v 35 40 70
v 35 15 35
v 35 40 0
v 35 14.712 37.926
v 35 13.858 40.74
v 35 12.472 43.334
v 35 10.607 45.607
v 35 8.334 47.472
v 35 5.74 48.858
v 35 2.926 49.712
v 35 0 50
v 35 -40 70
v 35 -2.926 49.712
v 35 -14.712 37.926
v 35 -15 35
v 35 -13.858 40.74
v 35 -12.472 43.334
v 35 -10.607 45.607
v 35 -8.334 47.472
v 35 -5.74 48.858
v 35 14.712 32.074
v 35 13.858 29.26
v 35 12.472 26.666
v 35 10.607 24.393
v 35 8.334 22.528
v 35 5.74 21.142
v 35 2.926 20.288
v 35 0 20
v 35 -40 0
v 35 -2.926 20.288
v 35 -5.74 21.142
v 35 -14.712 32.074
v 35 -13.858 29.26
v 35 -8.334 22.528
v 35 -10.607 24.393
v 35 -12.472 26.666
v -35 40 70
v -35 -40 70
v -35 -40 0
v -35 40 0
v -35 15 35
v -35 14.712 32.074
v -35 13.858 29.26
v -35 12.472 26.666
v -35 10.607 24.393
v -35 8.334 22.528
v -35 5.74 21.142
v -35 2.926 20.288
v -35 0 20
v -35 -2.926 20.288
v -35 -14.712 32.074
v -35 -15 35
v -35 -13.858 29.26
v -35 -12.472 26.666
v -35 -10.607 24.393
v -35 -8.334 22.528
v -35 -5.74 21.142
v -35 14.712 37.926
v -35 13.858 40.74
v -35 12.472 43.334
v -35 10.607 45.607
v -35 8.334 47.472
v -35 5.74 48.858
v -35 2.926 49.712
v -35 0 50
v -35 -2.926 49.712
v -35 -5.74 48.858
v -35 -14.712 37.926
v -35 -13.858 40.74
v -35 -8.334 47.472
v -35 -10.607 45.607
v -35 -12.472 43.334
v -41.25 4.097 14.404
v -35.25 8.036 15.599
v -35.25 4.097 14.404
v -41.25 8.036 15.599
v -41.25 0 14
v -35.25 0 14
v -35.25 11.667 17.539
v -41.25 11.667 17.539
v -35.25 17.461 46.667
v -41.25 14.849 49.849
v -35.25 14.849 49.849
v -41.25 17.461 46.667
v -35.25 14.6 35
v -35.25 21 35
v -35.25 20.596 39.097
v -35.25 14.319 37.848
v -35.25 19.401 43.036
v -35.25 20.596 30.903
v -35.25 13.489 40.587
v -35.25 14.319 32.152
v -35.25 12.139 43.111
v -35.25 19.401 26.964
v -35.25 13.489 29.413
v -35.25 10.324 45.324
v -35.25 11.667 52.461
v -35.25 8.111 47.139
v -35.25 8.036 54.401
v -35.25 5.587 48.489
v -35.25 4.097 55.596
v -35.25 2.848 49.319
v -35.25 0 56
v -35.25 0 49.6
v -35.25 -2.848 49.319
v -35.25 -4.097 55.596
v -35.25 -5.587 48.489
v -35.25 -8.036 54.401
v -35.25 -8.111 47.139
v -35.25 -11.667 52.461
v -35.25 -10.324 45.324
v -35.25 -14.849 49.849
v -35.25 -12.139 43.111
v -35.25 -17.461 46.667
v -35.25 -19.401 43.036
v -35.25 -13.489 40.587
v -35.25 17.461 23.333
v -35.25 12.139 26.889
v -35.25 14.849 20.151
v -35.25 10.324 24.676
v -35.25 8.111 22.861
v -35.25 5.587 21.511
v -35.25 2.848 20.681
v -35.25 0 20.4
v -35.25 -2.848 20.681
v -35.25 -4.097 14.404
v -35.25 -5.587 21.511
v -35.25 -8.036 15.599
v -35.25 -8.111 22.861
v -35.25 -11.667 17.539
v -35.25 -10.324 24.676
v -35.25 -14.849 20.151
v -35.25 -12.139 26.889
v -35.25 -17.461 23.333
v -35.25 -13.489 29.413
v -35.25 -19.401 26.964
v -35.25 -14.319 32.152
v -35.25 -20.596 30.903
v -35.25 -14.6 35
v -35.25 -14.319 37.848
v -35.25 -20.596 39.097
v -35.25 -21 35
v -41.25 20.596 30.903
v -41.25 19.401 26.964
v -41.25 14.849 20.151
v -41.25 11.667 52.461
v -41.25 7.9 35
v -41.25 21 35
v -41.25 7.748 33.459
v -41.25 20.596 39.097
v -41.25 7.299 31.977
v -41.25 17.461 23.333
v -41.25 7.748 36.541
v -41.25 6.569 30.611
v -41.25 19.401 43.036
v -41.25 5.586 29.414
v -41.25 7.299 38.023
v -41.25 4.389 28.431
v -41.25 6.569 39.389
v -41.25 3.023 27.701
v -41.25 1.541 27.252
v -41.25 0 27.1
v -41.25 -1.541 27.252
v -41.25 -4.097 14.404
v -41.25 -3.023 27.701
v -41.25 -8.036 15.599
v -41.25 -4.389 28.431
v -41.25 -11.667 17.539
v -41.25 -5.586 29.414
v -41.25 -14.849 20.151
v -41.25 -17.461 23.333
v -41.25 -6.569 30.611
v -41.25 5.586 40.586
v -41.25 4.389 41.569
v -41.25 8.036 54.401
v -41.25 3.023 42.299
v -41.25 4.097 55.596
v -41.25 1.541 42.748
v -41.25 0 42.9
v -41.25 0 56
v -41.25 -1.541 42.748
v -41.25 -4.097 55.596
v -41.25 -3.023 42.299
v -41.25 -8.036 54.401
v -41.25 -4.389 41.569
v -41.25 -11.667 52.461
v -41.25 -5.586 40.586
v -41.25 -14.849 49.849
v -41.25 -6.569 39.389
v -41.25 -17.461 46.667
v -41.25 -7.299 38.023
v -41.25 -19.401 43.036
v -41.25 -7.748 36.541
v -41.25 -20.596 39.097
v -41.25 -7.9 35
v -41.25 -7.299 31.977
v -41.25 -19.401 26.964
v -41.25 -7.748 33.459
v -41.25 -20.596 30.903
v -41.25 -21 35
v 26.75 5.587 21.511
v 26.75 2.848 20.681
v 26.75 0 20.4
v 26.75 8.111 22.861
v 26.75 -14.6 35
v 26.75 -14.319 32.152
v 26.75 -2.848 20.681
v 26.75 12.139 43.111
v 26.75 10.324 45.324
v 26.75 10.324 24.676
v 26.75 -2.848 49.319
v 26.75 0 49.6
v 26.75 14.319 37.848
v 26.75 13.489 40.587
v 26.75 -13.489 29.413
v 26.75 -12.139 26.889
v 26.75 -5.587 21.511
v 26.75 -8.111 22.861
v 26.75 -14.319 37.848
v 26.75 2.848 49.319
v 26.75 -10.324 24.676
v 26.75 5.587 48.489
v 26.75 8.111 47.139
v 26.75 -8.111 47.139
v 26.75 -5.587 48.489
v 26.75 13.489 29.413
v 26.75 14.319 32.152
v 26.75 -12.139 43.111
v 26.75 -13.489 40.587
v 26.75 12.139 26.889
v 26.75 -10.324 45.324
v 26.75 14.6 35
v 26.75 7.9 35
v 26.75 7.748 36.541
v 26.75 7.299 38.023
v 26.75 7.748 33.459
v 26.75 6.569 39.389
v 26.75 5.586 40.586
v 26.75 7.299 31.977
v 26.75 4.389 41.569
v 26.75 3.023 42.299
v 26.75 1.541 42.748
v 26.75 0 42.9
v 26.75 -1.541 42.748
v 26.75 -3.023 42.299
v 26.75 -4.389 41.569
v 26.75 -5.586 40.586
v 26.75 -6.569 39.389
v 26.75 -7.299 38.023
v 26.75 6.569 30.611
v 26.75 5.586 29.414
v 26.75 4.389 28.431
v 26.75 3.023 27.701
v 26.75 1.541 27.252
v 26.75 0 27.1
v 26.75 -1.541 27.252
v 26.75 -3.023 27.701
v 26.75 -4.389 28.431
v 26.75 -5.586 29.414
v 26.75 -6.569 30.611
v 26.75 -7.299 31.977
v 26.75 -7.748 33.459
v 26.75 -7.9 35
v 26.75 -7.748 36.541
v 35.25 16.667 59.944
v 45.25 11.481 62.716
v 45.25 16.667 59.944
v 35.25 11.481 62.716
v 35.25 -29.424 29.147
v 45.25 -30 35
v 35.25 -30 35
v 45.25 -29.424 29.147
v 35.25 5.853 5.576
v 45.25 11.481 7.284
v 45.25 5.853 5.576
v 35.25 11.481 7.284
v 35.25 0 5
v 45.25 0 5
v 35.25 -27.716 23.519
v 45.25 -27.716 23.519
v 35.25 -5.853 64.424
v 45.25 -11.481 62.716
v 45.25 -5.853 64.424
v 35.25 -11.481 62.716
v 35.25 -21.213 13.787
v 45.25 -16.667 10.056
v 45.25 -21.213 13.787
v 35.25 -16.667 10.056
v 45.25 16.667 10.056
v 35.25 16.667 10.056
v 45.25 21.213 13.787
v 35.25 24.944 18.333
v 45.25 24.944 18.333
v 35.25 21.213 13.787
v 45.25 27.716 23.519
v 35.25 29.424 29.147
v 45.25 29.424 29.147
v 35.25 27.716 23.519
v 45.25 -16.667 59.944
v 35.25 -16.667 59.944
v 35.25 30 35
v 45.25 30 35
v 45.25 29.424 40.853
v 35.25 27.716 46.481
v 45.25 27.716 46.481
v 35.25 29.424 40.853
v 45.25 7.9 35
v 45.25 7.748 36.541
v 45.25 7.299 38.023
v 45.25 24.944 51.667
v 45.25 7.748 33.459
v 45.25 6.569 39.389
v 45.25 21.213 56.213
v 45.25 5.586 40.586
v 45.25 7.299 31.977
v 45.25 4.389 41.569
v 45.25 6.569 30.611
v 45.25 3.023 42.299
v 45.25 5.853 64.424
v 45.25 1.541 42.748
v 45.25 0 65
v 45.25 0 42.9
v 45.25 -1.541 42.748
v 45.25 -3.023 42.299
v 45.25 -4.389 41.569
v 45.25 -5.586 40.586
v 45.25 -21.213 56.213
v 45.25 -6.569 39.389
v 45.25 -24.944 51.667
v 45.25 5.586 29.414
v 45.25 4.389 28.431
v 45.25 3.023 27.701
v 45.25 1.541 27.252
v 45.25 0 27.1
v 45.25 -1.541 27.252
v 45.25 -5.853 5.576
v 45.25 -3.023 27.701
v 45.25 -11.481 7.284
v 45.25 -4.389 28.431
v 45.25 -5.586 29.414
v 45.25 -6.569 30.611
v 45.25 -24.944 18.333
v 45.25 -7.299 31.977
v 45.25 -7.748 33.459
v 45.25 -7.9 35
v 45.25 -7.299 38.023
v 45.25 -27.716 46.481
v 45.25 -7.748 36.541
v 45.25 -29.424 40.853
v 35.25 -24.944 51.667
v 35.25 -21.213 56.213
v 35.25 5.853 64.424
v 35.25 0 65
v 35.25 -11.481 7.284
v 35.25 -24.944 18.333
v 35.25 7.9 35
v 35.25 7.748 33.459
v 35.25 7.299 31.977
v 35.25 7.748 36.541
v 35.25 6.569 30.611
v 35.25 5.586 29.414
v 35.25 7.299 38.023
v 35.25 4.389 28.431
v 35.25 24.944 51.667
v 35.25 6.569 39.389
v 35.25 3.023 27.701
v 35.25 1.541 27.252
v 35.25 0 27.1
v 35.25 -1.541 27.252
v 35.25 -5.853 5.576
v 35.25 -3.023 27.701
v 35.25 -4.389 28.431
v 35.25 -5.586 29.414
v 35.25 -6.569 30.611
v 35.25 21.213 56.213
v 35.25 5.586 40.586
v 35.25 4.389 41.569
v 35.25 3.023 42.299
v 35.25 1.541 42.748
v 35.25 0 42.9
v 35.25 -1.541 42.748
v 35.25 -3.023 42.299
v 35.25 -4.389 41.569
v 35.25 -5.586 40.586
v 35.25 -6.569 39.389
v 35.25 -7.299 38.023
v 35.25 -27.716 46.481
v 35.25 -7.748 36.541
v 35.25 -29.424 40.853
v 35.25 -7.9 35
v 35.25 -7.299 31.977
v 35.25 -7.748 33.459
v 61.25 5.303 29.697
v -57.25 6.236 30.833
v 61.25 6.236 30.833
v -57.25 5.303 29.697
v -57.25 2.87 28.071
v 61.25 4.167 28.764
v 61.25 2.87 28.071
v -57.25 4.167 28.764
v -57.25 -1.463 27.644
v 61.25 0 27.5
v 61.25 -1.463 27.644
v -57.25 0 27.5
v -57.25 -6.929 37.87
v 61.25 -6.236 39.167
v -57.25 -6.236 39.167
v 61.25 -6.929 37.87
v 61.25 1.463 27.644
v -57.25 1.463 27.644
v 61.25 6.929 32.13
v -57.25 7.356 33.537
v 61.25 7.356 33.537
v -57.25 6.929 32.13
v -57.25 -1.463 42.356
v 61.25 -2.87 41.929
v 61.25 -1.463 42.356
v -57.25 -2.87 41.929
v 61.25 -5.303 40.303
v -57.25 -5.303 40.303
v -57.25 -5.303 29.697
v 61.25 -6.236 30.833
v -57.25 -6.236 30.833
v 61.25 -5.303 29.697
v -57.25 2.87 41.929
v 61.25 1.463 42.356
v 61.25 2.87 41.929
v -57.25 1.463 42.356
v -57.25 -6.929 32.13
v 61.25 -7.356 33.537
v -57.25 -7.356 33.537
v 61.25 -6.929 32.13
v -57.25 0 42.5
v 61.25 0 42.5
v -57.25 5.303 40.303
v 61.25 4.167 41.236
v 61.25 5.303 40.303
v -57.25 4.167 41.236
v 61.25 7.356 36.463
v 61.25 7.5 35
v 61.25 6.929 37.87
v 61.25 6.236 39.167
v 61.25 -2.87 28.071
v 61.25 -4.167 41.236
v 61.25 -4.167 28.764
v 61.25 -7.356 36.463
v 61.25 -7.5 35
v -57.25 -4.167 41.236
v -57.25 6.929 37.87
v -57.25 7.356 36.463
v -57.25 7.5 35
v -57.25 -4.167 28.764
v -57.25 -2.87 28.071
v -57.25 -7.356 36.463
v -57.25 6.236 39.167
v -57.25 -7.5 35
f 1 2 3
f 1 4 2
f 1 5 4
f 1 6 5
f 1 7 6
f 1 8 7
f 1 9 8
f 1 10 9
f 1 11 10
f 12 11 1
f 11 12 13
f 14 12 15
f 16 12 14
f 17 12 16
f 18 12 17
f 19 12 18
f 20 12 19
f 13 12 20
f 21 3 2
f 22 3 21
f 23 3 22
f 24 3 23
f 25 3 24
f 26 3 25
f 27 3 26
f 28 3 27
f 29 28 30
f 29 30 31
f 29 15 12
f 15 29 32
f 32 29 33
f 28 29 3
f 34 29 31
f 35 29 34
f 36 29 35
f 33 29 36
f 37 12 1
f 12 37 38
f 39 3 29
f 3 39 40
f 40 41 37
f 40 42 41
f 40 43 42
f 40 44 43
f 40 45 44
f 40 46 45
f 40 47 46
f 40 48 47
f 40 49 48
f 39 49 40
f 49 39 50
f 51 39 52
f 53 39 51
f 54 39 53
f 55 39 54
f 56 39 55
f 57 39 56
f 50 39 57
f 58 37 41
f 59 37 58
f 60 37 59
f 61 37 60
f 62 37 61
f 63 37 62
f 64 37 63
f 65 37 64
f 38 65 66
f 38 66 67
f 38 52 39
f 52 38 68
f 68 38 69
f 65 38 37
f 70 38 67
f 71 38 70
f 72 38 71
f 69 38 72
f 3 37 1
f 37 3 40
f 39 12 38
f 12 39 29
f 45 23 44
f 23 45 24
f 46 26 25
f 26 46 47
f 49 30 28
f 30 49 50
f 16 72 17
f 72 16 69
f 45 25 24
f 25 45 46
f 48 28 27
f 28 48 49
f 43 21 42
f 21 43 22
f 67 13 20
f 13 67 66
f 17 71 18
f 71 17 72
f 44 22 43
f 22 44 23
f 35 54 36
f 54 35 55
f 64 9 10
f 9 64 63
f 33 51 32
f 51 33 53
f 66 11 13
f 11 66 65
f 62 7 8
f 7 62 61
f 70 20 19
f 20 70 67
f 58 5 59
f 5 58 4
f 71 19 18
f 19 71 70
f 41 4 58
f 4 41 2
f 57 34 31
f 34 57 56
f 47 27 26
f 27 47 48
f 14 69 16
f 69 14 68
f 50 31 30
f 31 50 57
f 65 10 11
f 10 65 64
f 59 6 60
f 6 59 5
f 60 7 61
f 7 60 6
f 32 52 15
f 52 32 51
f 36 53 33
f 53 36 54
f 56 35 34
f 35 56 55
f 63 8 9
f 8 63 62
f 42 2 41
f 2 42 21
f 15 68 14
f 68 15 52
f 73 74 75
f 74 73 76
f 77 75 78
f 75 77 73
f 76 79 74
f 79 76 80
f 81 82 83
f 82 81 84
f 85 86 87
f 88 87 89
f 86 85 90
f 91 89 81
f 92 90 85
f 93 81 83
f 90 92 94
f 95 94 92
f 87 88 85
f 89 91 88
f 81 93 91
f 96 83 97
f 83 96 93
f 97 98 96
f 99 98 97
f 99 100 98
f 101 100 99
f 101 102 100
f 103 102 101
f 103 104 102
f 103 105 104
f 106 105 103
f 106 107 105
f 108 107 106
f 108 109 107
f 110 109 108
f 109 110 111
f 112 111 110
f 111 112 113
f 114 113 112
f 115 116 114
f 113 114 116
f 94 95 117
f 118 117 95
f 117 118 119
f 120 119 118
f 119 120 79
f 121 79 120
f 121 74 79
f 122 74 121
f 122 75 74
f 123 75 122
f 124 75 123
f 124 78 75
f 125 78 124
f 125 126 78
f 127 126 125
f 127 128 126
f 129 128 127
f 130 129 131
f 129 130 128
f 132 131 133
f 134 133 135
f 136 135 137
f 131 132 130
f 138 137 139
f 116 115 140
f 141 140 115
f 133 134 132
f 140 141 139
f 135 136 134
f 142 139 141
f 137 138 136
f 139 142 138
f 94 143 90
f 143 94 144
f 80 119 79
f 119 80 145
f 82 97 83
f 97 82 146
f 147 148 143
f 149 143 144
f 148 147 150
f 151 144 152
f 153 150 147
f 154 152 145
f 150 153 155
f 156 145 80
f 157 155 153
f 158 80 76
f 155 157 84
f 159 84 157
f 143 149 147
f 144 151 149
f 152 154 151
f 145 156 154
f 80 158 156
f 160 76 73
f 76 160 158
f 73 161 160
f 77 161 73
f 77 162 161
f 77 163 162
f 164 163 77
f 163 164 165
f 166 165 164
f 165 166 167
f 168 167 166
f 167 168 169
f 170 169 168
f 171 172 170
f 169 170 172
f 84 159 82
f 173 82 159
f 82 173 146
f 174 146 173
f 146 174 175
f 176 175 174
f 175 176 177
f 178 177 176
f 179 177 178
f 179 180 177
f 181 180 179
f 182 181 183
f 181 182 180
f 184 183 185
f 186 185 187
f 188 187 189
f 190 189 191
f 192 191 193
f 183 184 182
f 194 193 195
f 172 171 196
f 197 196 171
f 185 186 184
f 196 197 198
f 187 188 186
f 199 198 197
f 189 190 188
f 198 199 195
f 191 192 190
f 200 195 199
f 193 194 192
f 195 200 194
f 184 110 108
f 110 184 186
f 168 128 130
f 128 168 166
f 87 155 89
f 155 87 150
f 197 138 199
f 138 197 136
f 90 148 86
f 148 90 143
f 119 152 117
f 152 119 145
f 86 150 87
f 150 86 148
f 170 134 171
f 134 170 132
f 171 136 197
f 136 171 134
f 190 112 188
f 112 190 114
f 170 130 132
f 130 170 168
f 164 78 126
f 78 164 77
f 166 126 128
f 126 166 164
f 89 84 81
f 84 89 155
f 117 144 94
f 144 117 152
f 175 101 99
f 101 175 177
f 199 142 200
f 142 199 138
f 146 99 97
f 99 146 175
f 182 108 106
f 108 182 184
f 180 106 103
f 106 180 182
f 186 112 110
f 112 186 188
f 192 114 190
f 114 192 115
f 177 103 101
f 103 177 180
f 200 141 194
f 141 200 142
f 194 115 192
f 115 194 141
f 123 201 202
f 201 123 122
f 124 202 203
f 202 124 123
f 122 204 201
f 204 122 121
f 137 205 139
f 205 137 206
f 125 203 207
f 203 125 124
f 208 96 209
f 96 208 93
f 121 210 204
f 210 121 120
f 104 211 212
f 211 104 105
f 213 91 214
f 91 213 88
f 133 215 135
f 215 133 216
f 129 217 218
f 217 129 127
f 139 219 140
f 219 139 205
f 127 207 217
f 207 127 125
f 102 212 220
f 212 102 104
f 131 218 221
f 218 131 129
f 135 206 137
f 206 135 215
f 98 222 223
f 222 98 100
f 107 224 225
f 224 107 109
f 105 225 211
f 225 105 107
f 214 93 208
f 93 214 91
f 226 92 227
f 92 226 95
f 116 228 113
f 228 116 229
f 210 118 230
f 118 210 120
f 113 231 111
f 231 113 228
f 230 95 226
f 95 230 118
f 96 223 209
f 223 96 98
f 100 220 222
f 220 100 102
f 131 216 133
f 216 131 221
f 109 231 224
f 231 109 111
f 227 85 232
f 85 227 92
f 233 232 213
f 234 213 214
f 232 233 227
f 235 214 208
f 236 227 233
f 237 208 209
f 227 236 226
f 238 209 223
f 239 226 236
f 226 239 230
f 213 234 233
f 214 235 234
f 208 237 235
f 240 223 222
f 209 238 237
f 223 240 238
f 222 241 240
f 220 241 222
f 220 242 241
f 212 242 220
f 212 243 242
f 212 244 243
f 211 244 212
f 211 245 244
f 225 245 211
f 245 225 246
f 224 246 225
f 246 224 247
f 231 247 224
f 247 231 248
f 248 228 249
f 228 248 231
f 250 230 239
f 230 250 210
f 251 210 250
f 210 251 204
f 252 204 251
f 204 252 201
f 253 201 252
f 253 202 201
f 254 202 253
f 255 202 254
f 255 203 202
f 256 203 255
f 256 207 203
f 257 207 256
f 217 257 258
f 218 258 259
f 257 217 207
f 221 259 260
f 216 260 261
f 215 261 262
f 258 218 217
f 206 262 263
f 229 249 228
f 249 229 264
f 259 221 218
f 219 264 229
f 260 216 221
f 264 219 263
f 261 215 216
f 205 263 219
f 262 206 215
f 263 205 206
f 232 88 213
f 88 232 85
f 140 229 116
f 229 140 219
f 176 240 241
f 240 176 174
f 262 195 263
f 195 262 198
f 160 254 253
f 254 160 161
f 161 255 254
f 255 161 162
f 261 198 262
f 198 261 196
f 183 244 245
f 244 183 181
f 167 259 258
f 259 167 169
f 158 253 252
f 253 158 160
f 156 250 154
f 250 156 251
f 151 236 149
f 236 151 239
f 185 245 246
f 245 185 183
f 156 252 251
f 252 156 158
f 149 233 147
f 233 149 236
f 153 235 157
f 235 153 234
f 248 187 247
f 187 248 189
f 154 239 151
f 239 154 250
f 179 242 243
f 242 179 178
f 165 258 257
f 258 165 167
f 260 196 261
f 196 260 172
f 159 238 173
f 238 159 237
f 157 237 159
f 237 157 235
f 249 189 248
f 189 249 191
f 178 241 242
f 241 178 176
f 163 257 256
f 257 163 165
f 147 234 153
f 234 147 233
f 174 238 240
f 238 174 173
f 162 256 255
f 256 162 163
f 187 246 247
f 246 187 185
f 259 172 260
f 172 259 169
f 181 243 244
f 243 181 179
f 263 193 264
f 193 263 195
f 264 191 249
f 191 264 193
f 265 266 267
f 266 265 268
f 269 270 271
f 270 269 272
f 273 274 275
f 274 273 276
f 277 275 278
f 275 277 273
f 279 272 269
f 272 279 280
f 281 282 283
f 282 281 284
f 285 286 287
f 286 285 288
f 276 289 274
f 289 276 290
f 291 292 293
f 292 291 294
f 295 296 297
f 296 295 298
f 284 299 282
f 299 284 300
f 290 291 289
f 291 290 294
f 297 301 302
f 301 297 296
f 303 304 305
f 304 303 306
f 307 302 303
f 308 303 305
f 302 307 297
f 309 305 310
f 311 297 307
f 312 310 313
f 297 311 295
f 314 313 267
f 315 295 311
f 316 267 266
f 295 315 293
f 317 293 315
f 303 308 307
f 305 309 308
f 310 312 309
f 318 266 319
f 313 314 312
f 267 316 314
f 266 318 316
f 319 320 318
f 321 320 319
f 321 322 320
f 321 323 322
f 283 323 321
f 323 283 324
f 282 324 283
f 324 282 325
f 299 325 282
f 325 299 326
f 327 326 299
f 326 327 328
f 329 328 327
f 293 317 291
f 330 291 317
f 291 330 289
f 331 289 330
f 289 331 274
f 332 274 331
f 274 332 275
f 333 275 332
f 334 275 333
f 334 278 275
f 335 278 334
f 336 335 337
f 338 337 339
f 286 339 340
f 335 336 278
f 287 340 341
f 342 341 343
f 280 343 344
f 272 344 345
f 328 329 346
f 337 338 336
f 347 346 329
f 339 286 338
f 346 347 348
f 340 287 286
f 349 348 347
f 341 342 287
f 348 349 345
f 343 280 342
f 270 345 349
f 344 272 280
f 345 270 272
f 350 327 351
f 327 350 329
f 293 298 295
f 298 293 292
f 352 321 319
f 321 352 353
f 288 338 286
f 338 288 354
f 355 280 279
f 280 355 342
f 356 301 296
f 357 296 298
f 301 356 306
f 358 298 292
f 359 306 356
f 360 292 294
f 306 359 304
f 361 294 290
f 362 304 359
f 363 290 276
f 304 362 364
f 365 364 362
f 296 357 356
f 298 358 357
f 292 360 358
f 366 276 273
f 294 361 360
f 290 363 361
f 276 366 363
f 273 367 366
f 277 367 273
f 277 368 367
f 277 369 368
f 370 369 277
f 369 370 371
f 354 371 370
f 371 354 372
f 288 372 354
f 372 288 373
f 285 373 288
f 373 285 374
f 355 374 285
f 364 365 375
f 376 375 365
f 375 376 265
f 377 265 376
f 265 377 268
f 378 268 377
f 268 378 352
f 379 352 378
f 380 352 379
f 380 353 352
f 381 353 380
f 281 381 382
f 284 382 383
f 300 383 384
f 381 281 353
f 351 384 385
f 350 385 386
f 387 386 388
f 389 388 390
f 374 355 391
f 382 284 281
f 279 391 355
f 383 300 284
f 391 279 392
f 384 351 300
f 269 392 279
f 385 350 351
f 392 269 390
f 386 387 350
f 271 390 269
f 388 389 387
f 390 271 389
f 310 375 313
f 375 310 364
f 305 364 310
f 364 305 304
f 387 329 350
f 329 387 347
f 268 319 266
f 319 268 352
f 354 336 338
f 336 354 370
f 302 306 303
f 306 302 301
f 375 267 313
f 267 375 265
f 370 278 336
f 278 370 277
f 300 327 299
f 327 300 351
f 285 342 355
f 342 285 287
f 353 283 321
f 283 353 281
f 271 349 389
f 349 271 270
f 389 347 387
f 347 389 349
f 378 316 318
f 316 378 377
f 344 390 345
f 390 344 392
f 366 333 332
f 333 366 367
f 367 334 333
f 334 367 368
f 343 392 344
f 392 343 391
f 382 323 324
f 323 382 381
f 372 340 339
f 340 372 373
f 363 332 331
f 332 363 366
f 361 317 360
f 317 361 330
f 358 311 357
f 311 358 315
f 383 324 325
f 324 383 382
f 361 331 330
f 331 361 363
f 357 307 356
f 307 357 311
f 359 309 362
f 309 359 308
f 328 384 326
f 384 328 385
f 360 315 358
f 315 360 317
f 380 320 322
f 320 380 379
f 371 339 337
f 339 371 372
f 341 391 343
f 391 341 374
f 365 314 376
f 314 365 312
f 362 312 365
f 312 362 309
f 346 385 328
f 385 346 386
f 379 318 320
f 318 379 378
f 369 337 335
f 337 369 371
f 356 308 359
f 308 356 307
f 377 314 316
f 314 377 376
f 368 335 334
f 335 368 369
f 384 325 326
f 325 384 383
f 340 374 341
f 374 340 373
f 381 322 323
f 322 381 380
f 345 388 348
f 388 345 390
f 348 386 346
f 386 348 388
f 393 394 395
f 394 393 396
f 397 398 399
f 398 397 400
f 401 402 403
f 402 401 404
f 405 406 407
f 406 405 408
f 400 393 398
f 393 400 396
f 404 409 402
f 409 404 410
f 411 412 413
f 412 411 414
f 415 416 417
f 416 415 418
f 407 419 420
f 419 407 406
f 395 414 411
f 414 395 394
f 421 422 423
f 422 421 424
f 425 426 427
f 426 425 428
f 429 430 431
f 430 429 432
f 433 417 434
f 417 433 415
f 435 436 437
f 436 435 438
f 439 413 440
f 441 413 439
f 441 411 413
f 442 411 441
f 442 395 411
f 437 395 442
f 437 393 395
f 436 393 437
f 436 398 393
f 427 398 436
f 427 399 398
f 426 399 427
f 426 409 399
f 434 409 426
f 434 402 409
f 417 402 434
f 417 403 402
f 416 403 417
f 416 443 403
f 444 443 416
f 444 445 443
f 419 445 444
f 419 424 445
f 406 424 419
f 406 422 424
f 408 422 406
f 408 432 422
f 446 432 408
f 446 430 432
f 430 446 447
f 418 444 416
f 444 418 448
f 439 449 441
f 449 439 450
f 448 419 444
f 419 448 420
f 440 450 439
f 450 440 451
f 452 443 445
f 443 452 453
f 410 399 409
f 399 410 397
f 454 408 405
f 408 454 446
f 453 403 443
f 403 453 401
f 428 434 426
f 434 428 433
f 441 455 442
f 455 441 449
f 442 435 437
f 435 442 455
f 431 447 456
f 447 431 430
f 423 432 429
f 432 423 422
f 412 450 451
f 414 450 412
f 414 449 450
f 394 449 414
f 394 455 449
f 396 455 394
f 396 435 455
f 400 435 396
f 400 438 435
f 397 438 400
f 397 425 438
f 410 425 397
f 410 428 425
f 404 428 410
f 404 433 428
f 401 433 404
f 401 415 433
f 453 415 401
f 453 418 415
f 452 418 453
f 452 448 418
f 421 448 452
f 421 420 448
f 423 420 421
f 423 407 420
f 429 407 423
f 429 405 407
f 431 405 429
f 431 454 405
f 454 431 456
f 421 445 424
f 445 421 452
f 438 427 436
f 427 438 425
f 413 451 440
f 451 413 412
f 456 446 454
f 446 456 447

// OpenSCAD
$fn = 32;

// ------------------------------------------------------------------------
// Bushed housing: 70 x 80 x 70 mm housing, bushing d29.2
// Every part is its own module, assembly() places them once.
// ------------------------------------------------------------------------

// --- part 1 ---
module housing() {
  difference() {
    translate([-35, -40, 0]) cube([70, 80, 70]);
    translate([0, 0, 35]) rotate([0, 90, 0]) cylinder(h = 72, d = 30, center = true);
  }
}

// --- part 2 ---
module bushing() {
  difference() {
    union() {
      cylinder(h = 6, d = 42);
      translate([0, 0, 6]) cylinder(h = 62, d = 29.2);
    }
    translate([0, 0, -1]) cylinder(h = 70, d = 15.8);
  }
}

// --- part 3 ---
module shaft() {
  translate([0, 0, -59.25]) cylinder(h = 118.5, d = 15);
}

// --- part 4 ---
module cover() {
  difference() {
    cylinder(h = 10, d = 60);
    translate([0, 0, -1]) cylinder(h = 12, d = 15.8);
  }
}

// --- assembly ---
module assembly() {
  translate([0, 0, 0]) rotate([0, 0, 0]) housing();
  translate([-41.25, 0, 35]) rotate([0, 90, 0]) bushing();
  translate([2, 0, 35]) rotate([0, 90, 0]) shaft();
  translate([35.25, 0, 35]) rotate([0, 90, 0]) cover();
}

assembly();
